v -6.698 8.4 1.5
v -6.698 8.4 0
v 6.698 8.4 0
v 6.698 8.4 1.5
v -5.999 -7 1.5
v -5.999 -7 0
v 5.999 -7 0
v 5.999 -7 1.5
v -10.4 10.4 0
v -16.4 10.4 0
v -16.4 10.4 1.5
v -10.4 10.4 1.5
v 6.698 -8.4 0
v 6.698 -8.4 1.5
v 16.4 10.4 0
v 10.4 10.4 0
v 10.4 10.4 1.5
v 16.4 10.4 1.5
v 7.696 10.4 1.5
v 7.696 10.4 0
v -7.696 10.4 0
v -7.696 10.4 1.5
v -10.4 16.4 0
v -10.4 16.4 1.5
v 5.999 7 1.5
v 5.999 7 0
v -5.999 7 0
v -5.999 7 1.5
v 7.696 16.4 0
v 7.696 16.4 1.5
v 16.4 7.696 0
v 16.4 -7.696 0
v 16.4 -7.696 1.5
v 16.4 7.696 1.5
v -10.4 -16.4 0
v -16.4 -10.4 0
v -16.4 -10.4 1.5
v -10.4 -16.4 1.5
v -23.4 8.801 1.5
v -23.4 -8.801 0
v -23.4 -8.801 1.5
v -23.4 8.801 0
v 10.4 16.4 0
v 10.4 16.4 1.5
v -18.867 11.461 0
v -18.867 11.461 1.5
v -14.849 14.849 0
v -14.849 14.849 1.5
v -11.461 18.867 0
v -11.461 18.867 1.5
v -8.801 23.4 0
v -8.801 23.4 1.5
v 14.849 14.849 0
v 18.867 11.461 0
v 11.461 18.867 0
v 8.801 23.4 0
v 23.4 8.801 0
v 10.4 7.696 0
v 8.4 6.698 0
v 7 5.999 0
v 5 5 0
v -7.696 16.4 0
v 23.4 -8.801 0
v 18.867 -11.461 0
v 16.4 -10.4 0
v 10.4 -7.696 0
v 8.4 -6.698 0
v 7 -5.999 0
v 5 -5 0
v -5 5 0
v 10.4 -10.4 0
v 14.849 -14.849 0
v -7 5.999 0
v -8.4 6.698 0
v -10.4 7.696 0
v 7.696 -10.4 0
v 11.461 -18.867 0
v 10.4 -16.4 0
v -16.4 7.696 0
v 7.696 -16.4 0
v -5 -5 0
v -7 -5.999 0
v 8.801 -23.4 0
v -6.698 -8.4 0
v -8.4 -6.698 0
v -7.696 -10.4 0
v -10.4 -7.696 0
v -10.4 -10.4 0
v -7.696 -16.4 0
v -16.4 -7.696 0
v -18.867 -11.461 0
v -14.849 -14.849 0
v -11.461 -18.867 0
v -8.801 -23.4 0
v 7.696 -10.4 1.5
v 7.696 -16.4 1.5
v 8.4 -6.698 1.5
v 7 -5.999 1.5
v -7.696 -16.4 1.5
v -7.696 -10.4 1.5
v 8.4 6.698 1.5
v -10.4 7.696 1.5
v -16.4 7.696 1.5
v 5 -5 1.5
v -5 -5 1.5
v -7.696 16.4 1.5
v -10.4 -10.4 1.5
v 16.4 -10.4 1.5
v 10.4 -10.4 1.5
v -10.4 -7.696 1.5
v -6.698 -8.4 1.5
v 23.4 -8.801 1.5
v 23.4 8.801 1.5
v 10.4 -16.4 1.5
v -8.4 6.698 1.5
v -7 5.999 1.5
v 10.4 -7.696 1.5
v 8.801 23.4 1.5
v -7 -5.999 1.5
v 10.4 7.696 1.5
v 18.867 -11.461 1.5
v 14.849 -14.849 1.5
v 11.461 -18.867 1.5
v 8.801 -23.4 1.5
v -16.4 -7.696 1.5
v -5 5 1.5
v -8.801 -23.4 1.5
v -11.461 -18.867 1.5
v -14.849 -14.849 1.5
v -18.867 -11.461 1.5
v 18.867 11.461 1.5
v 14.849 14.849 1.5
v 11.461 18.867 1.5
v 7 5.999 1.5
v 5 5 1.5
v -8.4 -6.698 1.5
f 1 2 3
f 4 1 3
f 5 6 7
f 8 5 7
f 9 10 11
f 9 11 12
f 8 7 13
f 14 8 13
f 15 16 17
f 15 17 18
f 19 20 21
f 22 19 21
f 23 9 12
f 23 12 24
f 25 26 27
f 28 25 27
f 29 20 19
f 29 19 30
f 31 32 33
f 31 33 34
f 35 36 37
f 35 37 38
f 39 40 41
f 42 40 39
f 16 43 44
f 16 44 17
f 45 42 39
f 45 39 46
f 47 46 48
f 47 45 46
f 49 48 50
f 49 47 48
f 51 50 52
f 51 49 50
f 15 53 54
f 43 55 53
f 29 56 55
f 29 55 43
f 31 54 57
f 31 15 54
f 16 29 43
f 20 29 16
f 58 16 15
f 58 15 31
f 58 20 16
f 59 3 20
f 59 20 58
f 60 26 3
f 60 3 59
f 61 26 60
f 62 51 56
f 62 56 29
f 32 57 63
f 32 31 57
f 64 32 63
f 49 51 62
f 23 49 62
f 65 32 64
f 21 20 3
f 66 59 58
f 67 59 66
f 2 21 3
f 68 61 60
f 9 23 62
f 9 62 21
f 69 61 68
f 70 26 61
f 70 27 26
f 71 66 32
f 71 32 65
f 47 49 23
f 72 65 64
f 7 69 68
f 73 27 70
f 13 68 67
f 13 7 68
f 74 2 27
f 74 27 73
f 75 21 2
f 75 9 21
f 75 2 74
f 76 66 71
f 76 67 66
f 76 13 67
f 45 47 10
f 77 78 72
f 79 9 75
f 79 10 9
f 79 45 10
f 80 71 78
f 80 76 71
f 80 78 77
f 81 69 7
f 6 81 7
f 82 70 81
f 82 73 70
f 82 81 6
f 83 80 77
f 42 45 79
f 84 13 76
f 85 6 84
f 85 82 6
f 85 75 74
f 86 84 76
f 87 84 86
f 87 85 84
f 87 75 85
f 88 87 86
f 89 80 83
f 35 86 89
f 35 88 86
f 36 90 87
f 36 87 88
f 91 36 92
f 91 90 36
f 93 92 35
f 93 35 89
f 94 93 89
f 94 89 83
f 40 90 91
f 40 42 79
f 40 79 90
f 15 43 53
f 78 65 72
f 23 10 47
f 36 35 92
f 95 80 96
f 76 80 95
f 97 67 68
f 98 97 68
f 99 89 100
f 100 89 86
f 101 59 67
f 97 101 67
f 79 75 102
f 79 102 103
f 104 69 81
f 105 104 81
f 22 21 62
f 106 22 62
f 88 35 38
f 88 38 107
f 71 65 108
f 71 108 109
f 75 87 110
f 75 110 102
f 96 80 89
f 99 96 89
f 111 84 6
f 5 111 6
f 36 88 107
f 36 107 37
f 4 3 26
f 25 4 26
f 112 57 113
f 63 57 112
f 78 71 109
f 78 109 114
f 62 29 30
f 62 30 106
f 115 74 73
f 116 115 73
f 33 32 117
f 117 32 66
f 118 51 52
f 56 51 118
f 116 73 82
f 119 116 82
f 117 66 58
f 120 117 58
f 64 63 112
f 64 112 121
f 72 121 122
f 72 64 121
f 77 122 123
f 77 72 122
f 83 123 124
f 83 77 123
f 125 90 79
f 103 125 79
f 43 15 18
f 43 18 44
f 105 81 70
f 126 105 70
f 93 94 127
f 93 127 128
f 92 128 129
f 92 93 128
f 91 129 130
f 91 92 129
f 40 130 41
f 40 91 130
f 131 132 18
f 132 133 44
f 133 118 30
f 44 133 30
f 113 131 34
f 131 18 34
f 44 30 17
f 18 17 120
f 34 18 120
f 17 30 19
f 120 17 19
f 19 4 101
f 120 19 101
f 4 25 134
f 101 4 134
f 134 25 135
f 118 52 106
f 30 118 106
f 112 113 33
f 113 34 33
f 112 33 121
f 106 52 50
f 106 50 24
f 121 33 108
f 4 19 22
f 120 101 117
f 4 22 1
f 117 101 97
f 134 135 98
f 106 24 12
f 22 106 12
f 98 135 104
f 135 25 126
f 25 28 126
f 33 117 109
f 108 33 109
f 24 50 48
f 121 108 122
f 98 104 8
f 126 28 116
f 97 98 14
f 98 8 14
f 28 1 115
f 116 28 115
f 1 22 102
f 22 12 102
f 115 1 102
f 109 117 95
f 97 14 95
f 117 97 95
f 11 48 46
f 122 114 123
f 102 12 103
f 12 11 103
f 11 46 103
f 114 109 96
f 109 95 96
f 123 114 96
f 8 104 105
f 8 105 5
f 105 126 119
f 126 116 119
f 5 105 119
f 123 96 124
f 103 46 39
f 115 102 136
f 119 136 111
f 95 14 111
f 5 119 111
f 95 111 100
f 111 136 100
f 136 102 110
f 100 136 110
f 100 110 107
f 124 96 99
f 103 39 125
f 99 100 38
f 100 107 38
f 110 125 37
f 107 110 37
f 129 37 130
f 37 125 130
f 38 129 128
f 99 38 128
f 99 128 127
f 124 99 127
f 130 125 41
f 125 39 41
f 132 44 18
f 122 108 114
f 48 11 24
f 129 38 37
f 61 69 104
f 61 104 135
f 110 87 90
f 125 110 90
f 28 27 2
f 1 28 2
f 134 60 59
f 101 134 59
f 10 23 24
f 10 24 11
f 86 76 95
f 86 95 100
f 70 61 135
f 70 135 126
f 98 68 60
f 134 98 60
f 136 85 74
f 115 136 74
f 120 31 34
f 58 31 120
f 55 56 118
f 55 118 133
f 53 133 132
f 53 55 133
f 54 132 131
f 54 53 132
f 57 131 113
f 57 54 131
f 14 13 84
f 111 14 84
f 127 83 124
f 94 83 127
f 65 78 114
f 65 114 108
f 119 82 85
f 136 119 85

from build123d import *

# Parameters (mm, degrees)
EXTRUDE001_DEPTH = 3
FACE001_W        = 6
FACE001_H        = 15.392872
EXTRUDE002_DEPTH = 3
EXTRUDE003_DEPTH = 3
FACE003_W        = 15.392872
FACE003_H        = 6
EXTRUDE004_DEPTH = 3
EXTRUDE005_DEPTH = 3
EXTRUDE006_DEPTH = 3
EXTRUDE007_DEPTH = 3
FACE007_W        = 10
FACE007_H        = 10
EXTRUDE008_DEPTH = 3
EXTRUDE009_DEPTH = 3
EXTRUDE010_DEPTH = 3
EXTRUDE012_DEPTH = 3
FACE012_W        = 6
FACE012_H        = 15.392872
EXTRUDE013_DEPTH = 3
FACE010_W        = 15.392872
FACE010_H        = 6
EXTRUDE011_DEPTH = 3
EXTRUDE_DEPTH    = 1.5


with BuildPart() as extrude001:
    # Face → Extrude001 (new body)
    with BuildSketch(Plane(origin=(-12.399665, 12.399665, 0), x_dir=(0, 1, 0), z_dir=(0, 0, 1))):
        Polygon((4, -2), (-2, 4), (-2, -2), align=None)
    extrude(amount=EXTRUDE001_DEPTH)


with BuildPart() as extrude002:
    # Face001 → Extrude002 (new body)
    with BuildSketch(Plane(origin=(0, 13.399665, 0), x_dir=(0, 1, 0), z_dir=(0, 0, 1))):
        Rectangle(FACE001_W, FACE001_H)
    extrude(amount=EXTRUDE002_DEPTH)


with BuildPart() as extrude003:
    # Face002 → Extrude003 (new body)
    with BuildSketch(Plane(origin=(12.399665, 12.399665, 0), x_dir=(0, 1, 0), z_dir=(0, 0, 1))):
        Polygon((-2, -4), (4, 2), (-2, 2), align=None)
    extrude(amount=EXTRUDE003_DEPTH)


with BuildPart() as extrude004:
    # Face003 → Extrude004 (new body)
    with BuildSketch(Plane(origin=(13.399665, 0, 0), x_dir=(0, 1, 0), z_dir=(0, 0, 1))):
        Rectangle(FACE003_W, FACE003_H)
    extrude(amount=EXTRUDE004_DEPTH)


with BuildPart() as extrude005:
    # Face004 → Extrude005 (new body)
    with BuildSketch(Plane(origin=(12.399665, -12.399665, 0), x_dir=(0, 1, 0), z_dir=(0, 0, 1))):
        Polygon((2, -4), (2, 2), (-4, 2), align=None)
    extrude(amount=EXTRUDE005_DEPTH)


with BuildPart() as extrude006:
    # Face005 → Extrude006 (new body)
    with BuildSketch(Plane(origin=(7.712675, 0, 0), x_dir=(0, -1, 0), z_dir=(0, 0, -1))):
        Polygon((5.998742, 0.712675), (-5.998742, 0.712675), (-6.697694, -0.686991), (6.697694, -0.686991), align=None)
    extrude(amount=-EXTRUDE006_DEPTH)


with BuildPart() as extrude007:
    # Face006 → Extrude007 (new body)
    with BuildSketch(Plane(origin=(0, 7.712675, 0), x_dir=(0, -1, 0), z_dir=(0, 0, -1))):
        Polygon((-0.686991, 6.697694), (-0.686991, -6.697694), (0.712675, -5.998742), (0.712675, 5.998742), align=None)
    extrude(amount=-EXTRUDE007_DEPTH)


with BuildPart() as extrude008:
    # Face007 → Extrude008 (new body)
    with BuildSketch(Plane(origin=(0, 0, 0), x_dir=(0, 1, 0), z_dir=(0, 0, 1))):
        Rectangle(FACE007_W, FACE007_H)
    extrude(amount=EXTRUDE008_DEPTH)


with BuildPart() as extrude009:
    # Face008 → Extrude009 (new body)
    with BuildSketch(Plane(origin=(0, -7.712675, 0), x_dir=(0, -1, 0), z_dir=(0, 0, -1))):
        Polygon((-0.712675, 5.998742), (-0.712675, -5.998742), (0.686991, -6.697694), (0.686991, 6.697694), align=None)
    extrude(amount=-EXTRUDE009_DEPTH)


with BuildPart() as extrude010:
    # Face009 → Extrude010 (new body)
    with BuildSketch(Plane(origin=(-7.712675, 0, 0), x_dir=(0, -1, 0), z_dir=(0, 0, -1))):
        Polygon((6.697694, 0.686991), (-6.697694, 0.686991), (-5.998742, -0.712675), (5.998742, -0.712675), align=None)
    extrude(amount=-EXTRUDE010_DEPTH)


with BuildPart() as extrude012:
    # Face011 → Extrude012 (new body)
    with BuildSketch(Plane(origin=(-12.399665, -12.399665, 0), x_dir=(0, 1, 0), z_dir=(0, 0, 1))):
        Polygon((2, -2), (2, 4), (-4, -2), align=None)
    extrude(amount=EXTRUDE012_DEPTH)


with BuildPart() as extrude013:
    # Face012 → Extrude013 (new body)
    with BuildSketch(Plane(origin=(0, -13.399665, 0), x_dir=(0, 1, 0), z_dir=(0, 0, 1))):
        Rectangle(FACE012_W, FACE012_H)
    extrude(amount=EXTRUDE013_DEPTH)


with BuildPart() as extrude011:
    # Face010 → Extrude011 (new body)
    with BuildSketch(Plane(origin=(-13.399665, 0, 0), x_dir=(0, 1, 0), z_dir=(0, 0, 1))):
        Rectangle(FACE010_W, FACE010_H)
    extrude(amount=EXTRUDE011_DEPTH)


with BuildPart() as cut012:
    # Face013 → Extrude (new body)
    with BuildSketch(Plane(origin=(0, 0, 0), x_dir=(0, -1, 0), z_dir=(0, 0, -1))):
        with BuildLine():
            ThreePointArc((23.399665, 8.800889), (14.849242, 14.849242), (8.800889, 23.399665))
            Line((8.800889, 23.399665), (-8.800889, 23.399665))
            ThreePointArc((-8.800889, 23.399665), (-14.849242, 14.849242), (-23.399665, 8.800889))
            Line((-23.399665, 8.800889), (-23.399665, -8.800889))
            ThreePointArc((-23.399665, -8.800889), (-14.849242, -14.849242), (-8.800889, -23.399665))
            Line((-8.800889, -23.399665), (8.800889, -23.399665))
            ThreePointArc((8.800889, -23.399665), (14.849242, -14.849242), (23.399665, -8.800889))
            Line((23.399665, -8.800889), (23.399665, 8.800889))
        make_face()
    extrude(amount=-EXTRUDE_DEPTH)

    # Cut: cut Extrude011
    add(extrude011.part, mode=Mode.SUBTRACT)

    # Cut001: cut Extrude013
    add(extrude013.part, mode=Mode.SUBTRACT)

    # Cut002: cut Extrude012
    add(extrude012.part, mode=Mode.SUBTRACT)

    # Cut003: cut Extrude010
    add(extrude010.part, mode=Mode.SUBTRACT)

    # Cut004: cut Extrude009
    add(extrude009.part, mode=Mode.SUBTRACT)

    # Cut005: cut Extrude008
    add(extrude008.part, mode=Mode.SUBTRACT)

    # Cut006: cut Extrude007
    add(extrude007.part, mode=Mode.SUBTRACT)

    # Cut007: cut Extrude006
    add(extrude006.part, mode=Mode.SUBTRACT)

    # Cut008: cut Extrude005
    add(extrude005.part, mode=Mode.SUBTRACT)

    # Cut009: cut Extrude004
    add(extrude004.part, mode=Mode.SUBTRACT)

    # Cut010: cut Extrude003
    add(extrude003.part, mode=Mode.SUBTRACT)

    # Cut011: cut Extrude002
    add(extrude002.part, mode=Mode.SUBTRACT)

    # Cut012: cut Extrude001
    add(extrude001.part, mode=Mode.SUBTRACT)


solid = cut012.part
